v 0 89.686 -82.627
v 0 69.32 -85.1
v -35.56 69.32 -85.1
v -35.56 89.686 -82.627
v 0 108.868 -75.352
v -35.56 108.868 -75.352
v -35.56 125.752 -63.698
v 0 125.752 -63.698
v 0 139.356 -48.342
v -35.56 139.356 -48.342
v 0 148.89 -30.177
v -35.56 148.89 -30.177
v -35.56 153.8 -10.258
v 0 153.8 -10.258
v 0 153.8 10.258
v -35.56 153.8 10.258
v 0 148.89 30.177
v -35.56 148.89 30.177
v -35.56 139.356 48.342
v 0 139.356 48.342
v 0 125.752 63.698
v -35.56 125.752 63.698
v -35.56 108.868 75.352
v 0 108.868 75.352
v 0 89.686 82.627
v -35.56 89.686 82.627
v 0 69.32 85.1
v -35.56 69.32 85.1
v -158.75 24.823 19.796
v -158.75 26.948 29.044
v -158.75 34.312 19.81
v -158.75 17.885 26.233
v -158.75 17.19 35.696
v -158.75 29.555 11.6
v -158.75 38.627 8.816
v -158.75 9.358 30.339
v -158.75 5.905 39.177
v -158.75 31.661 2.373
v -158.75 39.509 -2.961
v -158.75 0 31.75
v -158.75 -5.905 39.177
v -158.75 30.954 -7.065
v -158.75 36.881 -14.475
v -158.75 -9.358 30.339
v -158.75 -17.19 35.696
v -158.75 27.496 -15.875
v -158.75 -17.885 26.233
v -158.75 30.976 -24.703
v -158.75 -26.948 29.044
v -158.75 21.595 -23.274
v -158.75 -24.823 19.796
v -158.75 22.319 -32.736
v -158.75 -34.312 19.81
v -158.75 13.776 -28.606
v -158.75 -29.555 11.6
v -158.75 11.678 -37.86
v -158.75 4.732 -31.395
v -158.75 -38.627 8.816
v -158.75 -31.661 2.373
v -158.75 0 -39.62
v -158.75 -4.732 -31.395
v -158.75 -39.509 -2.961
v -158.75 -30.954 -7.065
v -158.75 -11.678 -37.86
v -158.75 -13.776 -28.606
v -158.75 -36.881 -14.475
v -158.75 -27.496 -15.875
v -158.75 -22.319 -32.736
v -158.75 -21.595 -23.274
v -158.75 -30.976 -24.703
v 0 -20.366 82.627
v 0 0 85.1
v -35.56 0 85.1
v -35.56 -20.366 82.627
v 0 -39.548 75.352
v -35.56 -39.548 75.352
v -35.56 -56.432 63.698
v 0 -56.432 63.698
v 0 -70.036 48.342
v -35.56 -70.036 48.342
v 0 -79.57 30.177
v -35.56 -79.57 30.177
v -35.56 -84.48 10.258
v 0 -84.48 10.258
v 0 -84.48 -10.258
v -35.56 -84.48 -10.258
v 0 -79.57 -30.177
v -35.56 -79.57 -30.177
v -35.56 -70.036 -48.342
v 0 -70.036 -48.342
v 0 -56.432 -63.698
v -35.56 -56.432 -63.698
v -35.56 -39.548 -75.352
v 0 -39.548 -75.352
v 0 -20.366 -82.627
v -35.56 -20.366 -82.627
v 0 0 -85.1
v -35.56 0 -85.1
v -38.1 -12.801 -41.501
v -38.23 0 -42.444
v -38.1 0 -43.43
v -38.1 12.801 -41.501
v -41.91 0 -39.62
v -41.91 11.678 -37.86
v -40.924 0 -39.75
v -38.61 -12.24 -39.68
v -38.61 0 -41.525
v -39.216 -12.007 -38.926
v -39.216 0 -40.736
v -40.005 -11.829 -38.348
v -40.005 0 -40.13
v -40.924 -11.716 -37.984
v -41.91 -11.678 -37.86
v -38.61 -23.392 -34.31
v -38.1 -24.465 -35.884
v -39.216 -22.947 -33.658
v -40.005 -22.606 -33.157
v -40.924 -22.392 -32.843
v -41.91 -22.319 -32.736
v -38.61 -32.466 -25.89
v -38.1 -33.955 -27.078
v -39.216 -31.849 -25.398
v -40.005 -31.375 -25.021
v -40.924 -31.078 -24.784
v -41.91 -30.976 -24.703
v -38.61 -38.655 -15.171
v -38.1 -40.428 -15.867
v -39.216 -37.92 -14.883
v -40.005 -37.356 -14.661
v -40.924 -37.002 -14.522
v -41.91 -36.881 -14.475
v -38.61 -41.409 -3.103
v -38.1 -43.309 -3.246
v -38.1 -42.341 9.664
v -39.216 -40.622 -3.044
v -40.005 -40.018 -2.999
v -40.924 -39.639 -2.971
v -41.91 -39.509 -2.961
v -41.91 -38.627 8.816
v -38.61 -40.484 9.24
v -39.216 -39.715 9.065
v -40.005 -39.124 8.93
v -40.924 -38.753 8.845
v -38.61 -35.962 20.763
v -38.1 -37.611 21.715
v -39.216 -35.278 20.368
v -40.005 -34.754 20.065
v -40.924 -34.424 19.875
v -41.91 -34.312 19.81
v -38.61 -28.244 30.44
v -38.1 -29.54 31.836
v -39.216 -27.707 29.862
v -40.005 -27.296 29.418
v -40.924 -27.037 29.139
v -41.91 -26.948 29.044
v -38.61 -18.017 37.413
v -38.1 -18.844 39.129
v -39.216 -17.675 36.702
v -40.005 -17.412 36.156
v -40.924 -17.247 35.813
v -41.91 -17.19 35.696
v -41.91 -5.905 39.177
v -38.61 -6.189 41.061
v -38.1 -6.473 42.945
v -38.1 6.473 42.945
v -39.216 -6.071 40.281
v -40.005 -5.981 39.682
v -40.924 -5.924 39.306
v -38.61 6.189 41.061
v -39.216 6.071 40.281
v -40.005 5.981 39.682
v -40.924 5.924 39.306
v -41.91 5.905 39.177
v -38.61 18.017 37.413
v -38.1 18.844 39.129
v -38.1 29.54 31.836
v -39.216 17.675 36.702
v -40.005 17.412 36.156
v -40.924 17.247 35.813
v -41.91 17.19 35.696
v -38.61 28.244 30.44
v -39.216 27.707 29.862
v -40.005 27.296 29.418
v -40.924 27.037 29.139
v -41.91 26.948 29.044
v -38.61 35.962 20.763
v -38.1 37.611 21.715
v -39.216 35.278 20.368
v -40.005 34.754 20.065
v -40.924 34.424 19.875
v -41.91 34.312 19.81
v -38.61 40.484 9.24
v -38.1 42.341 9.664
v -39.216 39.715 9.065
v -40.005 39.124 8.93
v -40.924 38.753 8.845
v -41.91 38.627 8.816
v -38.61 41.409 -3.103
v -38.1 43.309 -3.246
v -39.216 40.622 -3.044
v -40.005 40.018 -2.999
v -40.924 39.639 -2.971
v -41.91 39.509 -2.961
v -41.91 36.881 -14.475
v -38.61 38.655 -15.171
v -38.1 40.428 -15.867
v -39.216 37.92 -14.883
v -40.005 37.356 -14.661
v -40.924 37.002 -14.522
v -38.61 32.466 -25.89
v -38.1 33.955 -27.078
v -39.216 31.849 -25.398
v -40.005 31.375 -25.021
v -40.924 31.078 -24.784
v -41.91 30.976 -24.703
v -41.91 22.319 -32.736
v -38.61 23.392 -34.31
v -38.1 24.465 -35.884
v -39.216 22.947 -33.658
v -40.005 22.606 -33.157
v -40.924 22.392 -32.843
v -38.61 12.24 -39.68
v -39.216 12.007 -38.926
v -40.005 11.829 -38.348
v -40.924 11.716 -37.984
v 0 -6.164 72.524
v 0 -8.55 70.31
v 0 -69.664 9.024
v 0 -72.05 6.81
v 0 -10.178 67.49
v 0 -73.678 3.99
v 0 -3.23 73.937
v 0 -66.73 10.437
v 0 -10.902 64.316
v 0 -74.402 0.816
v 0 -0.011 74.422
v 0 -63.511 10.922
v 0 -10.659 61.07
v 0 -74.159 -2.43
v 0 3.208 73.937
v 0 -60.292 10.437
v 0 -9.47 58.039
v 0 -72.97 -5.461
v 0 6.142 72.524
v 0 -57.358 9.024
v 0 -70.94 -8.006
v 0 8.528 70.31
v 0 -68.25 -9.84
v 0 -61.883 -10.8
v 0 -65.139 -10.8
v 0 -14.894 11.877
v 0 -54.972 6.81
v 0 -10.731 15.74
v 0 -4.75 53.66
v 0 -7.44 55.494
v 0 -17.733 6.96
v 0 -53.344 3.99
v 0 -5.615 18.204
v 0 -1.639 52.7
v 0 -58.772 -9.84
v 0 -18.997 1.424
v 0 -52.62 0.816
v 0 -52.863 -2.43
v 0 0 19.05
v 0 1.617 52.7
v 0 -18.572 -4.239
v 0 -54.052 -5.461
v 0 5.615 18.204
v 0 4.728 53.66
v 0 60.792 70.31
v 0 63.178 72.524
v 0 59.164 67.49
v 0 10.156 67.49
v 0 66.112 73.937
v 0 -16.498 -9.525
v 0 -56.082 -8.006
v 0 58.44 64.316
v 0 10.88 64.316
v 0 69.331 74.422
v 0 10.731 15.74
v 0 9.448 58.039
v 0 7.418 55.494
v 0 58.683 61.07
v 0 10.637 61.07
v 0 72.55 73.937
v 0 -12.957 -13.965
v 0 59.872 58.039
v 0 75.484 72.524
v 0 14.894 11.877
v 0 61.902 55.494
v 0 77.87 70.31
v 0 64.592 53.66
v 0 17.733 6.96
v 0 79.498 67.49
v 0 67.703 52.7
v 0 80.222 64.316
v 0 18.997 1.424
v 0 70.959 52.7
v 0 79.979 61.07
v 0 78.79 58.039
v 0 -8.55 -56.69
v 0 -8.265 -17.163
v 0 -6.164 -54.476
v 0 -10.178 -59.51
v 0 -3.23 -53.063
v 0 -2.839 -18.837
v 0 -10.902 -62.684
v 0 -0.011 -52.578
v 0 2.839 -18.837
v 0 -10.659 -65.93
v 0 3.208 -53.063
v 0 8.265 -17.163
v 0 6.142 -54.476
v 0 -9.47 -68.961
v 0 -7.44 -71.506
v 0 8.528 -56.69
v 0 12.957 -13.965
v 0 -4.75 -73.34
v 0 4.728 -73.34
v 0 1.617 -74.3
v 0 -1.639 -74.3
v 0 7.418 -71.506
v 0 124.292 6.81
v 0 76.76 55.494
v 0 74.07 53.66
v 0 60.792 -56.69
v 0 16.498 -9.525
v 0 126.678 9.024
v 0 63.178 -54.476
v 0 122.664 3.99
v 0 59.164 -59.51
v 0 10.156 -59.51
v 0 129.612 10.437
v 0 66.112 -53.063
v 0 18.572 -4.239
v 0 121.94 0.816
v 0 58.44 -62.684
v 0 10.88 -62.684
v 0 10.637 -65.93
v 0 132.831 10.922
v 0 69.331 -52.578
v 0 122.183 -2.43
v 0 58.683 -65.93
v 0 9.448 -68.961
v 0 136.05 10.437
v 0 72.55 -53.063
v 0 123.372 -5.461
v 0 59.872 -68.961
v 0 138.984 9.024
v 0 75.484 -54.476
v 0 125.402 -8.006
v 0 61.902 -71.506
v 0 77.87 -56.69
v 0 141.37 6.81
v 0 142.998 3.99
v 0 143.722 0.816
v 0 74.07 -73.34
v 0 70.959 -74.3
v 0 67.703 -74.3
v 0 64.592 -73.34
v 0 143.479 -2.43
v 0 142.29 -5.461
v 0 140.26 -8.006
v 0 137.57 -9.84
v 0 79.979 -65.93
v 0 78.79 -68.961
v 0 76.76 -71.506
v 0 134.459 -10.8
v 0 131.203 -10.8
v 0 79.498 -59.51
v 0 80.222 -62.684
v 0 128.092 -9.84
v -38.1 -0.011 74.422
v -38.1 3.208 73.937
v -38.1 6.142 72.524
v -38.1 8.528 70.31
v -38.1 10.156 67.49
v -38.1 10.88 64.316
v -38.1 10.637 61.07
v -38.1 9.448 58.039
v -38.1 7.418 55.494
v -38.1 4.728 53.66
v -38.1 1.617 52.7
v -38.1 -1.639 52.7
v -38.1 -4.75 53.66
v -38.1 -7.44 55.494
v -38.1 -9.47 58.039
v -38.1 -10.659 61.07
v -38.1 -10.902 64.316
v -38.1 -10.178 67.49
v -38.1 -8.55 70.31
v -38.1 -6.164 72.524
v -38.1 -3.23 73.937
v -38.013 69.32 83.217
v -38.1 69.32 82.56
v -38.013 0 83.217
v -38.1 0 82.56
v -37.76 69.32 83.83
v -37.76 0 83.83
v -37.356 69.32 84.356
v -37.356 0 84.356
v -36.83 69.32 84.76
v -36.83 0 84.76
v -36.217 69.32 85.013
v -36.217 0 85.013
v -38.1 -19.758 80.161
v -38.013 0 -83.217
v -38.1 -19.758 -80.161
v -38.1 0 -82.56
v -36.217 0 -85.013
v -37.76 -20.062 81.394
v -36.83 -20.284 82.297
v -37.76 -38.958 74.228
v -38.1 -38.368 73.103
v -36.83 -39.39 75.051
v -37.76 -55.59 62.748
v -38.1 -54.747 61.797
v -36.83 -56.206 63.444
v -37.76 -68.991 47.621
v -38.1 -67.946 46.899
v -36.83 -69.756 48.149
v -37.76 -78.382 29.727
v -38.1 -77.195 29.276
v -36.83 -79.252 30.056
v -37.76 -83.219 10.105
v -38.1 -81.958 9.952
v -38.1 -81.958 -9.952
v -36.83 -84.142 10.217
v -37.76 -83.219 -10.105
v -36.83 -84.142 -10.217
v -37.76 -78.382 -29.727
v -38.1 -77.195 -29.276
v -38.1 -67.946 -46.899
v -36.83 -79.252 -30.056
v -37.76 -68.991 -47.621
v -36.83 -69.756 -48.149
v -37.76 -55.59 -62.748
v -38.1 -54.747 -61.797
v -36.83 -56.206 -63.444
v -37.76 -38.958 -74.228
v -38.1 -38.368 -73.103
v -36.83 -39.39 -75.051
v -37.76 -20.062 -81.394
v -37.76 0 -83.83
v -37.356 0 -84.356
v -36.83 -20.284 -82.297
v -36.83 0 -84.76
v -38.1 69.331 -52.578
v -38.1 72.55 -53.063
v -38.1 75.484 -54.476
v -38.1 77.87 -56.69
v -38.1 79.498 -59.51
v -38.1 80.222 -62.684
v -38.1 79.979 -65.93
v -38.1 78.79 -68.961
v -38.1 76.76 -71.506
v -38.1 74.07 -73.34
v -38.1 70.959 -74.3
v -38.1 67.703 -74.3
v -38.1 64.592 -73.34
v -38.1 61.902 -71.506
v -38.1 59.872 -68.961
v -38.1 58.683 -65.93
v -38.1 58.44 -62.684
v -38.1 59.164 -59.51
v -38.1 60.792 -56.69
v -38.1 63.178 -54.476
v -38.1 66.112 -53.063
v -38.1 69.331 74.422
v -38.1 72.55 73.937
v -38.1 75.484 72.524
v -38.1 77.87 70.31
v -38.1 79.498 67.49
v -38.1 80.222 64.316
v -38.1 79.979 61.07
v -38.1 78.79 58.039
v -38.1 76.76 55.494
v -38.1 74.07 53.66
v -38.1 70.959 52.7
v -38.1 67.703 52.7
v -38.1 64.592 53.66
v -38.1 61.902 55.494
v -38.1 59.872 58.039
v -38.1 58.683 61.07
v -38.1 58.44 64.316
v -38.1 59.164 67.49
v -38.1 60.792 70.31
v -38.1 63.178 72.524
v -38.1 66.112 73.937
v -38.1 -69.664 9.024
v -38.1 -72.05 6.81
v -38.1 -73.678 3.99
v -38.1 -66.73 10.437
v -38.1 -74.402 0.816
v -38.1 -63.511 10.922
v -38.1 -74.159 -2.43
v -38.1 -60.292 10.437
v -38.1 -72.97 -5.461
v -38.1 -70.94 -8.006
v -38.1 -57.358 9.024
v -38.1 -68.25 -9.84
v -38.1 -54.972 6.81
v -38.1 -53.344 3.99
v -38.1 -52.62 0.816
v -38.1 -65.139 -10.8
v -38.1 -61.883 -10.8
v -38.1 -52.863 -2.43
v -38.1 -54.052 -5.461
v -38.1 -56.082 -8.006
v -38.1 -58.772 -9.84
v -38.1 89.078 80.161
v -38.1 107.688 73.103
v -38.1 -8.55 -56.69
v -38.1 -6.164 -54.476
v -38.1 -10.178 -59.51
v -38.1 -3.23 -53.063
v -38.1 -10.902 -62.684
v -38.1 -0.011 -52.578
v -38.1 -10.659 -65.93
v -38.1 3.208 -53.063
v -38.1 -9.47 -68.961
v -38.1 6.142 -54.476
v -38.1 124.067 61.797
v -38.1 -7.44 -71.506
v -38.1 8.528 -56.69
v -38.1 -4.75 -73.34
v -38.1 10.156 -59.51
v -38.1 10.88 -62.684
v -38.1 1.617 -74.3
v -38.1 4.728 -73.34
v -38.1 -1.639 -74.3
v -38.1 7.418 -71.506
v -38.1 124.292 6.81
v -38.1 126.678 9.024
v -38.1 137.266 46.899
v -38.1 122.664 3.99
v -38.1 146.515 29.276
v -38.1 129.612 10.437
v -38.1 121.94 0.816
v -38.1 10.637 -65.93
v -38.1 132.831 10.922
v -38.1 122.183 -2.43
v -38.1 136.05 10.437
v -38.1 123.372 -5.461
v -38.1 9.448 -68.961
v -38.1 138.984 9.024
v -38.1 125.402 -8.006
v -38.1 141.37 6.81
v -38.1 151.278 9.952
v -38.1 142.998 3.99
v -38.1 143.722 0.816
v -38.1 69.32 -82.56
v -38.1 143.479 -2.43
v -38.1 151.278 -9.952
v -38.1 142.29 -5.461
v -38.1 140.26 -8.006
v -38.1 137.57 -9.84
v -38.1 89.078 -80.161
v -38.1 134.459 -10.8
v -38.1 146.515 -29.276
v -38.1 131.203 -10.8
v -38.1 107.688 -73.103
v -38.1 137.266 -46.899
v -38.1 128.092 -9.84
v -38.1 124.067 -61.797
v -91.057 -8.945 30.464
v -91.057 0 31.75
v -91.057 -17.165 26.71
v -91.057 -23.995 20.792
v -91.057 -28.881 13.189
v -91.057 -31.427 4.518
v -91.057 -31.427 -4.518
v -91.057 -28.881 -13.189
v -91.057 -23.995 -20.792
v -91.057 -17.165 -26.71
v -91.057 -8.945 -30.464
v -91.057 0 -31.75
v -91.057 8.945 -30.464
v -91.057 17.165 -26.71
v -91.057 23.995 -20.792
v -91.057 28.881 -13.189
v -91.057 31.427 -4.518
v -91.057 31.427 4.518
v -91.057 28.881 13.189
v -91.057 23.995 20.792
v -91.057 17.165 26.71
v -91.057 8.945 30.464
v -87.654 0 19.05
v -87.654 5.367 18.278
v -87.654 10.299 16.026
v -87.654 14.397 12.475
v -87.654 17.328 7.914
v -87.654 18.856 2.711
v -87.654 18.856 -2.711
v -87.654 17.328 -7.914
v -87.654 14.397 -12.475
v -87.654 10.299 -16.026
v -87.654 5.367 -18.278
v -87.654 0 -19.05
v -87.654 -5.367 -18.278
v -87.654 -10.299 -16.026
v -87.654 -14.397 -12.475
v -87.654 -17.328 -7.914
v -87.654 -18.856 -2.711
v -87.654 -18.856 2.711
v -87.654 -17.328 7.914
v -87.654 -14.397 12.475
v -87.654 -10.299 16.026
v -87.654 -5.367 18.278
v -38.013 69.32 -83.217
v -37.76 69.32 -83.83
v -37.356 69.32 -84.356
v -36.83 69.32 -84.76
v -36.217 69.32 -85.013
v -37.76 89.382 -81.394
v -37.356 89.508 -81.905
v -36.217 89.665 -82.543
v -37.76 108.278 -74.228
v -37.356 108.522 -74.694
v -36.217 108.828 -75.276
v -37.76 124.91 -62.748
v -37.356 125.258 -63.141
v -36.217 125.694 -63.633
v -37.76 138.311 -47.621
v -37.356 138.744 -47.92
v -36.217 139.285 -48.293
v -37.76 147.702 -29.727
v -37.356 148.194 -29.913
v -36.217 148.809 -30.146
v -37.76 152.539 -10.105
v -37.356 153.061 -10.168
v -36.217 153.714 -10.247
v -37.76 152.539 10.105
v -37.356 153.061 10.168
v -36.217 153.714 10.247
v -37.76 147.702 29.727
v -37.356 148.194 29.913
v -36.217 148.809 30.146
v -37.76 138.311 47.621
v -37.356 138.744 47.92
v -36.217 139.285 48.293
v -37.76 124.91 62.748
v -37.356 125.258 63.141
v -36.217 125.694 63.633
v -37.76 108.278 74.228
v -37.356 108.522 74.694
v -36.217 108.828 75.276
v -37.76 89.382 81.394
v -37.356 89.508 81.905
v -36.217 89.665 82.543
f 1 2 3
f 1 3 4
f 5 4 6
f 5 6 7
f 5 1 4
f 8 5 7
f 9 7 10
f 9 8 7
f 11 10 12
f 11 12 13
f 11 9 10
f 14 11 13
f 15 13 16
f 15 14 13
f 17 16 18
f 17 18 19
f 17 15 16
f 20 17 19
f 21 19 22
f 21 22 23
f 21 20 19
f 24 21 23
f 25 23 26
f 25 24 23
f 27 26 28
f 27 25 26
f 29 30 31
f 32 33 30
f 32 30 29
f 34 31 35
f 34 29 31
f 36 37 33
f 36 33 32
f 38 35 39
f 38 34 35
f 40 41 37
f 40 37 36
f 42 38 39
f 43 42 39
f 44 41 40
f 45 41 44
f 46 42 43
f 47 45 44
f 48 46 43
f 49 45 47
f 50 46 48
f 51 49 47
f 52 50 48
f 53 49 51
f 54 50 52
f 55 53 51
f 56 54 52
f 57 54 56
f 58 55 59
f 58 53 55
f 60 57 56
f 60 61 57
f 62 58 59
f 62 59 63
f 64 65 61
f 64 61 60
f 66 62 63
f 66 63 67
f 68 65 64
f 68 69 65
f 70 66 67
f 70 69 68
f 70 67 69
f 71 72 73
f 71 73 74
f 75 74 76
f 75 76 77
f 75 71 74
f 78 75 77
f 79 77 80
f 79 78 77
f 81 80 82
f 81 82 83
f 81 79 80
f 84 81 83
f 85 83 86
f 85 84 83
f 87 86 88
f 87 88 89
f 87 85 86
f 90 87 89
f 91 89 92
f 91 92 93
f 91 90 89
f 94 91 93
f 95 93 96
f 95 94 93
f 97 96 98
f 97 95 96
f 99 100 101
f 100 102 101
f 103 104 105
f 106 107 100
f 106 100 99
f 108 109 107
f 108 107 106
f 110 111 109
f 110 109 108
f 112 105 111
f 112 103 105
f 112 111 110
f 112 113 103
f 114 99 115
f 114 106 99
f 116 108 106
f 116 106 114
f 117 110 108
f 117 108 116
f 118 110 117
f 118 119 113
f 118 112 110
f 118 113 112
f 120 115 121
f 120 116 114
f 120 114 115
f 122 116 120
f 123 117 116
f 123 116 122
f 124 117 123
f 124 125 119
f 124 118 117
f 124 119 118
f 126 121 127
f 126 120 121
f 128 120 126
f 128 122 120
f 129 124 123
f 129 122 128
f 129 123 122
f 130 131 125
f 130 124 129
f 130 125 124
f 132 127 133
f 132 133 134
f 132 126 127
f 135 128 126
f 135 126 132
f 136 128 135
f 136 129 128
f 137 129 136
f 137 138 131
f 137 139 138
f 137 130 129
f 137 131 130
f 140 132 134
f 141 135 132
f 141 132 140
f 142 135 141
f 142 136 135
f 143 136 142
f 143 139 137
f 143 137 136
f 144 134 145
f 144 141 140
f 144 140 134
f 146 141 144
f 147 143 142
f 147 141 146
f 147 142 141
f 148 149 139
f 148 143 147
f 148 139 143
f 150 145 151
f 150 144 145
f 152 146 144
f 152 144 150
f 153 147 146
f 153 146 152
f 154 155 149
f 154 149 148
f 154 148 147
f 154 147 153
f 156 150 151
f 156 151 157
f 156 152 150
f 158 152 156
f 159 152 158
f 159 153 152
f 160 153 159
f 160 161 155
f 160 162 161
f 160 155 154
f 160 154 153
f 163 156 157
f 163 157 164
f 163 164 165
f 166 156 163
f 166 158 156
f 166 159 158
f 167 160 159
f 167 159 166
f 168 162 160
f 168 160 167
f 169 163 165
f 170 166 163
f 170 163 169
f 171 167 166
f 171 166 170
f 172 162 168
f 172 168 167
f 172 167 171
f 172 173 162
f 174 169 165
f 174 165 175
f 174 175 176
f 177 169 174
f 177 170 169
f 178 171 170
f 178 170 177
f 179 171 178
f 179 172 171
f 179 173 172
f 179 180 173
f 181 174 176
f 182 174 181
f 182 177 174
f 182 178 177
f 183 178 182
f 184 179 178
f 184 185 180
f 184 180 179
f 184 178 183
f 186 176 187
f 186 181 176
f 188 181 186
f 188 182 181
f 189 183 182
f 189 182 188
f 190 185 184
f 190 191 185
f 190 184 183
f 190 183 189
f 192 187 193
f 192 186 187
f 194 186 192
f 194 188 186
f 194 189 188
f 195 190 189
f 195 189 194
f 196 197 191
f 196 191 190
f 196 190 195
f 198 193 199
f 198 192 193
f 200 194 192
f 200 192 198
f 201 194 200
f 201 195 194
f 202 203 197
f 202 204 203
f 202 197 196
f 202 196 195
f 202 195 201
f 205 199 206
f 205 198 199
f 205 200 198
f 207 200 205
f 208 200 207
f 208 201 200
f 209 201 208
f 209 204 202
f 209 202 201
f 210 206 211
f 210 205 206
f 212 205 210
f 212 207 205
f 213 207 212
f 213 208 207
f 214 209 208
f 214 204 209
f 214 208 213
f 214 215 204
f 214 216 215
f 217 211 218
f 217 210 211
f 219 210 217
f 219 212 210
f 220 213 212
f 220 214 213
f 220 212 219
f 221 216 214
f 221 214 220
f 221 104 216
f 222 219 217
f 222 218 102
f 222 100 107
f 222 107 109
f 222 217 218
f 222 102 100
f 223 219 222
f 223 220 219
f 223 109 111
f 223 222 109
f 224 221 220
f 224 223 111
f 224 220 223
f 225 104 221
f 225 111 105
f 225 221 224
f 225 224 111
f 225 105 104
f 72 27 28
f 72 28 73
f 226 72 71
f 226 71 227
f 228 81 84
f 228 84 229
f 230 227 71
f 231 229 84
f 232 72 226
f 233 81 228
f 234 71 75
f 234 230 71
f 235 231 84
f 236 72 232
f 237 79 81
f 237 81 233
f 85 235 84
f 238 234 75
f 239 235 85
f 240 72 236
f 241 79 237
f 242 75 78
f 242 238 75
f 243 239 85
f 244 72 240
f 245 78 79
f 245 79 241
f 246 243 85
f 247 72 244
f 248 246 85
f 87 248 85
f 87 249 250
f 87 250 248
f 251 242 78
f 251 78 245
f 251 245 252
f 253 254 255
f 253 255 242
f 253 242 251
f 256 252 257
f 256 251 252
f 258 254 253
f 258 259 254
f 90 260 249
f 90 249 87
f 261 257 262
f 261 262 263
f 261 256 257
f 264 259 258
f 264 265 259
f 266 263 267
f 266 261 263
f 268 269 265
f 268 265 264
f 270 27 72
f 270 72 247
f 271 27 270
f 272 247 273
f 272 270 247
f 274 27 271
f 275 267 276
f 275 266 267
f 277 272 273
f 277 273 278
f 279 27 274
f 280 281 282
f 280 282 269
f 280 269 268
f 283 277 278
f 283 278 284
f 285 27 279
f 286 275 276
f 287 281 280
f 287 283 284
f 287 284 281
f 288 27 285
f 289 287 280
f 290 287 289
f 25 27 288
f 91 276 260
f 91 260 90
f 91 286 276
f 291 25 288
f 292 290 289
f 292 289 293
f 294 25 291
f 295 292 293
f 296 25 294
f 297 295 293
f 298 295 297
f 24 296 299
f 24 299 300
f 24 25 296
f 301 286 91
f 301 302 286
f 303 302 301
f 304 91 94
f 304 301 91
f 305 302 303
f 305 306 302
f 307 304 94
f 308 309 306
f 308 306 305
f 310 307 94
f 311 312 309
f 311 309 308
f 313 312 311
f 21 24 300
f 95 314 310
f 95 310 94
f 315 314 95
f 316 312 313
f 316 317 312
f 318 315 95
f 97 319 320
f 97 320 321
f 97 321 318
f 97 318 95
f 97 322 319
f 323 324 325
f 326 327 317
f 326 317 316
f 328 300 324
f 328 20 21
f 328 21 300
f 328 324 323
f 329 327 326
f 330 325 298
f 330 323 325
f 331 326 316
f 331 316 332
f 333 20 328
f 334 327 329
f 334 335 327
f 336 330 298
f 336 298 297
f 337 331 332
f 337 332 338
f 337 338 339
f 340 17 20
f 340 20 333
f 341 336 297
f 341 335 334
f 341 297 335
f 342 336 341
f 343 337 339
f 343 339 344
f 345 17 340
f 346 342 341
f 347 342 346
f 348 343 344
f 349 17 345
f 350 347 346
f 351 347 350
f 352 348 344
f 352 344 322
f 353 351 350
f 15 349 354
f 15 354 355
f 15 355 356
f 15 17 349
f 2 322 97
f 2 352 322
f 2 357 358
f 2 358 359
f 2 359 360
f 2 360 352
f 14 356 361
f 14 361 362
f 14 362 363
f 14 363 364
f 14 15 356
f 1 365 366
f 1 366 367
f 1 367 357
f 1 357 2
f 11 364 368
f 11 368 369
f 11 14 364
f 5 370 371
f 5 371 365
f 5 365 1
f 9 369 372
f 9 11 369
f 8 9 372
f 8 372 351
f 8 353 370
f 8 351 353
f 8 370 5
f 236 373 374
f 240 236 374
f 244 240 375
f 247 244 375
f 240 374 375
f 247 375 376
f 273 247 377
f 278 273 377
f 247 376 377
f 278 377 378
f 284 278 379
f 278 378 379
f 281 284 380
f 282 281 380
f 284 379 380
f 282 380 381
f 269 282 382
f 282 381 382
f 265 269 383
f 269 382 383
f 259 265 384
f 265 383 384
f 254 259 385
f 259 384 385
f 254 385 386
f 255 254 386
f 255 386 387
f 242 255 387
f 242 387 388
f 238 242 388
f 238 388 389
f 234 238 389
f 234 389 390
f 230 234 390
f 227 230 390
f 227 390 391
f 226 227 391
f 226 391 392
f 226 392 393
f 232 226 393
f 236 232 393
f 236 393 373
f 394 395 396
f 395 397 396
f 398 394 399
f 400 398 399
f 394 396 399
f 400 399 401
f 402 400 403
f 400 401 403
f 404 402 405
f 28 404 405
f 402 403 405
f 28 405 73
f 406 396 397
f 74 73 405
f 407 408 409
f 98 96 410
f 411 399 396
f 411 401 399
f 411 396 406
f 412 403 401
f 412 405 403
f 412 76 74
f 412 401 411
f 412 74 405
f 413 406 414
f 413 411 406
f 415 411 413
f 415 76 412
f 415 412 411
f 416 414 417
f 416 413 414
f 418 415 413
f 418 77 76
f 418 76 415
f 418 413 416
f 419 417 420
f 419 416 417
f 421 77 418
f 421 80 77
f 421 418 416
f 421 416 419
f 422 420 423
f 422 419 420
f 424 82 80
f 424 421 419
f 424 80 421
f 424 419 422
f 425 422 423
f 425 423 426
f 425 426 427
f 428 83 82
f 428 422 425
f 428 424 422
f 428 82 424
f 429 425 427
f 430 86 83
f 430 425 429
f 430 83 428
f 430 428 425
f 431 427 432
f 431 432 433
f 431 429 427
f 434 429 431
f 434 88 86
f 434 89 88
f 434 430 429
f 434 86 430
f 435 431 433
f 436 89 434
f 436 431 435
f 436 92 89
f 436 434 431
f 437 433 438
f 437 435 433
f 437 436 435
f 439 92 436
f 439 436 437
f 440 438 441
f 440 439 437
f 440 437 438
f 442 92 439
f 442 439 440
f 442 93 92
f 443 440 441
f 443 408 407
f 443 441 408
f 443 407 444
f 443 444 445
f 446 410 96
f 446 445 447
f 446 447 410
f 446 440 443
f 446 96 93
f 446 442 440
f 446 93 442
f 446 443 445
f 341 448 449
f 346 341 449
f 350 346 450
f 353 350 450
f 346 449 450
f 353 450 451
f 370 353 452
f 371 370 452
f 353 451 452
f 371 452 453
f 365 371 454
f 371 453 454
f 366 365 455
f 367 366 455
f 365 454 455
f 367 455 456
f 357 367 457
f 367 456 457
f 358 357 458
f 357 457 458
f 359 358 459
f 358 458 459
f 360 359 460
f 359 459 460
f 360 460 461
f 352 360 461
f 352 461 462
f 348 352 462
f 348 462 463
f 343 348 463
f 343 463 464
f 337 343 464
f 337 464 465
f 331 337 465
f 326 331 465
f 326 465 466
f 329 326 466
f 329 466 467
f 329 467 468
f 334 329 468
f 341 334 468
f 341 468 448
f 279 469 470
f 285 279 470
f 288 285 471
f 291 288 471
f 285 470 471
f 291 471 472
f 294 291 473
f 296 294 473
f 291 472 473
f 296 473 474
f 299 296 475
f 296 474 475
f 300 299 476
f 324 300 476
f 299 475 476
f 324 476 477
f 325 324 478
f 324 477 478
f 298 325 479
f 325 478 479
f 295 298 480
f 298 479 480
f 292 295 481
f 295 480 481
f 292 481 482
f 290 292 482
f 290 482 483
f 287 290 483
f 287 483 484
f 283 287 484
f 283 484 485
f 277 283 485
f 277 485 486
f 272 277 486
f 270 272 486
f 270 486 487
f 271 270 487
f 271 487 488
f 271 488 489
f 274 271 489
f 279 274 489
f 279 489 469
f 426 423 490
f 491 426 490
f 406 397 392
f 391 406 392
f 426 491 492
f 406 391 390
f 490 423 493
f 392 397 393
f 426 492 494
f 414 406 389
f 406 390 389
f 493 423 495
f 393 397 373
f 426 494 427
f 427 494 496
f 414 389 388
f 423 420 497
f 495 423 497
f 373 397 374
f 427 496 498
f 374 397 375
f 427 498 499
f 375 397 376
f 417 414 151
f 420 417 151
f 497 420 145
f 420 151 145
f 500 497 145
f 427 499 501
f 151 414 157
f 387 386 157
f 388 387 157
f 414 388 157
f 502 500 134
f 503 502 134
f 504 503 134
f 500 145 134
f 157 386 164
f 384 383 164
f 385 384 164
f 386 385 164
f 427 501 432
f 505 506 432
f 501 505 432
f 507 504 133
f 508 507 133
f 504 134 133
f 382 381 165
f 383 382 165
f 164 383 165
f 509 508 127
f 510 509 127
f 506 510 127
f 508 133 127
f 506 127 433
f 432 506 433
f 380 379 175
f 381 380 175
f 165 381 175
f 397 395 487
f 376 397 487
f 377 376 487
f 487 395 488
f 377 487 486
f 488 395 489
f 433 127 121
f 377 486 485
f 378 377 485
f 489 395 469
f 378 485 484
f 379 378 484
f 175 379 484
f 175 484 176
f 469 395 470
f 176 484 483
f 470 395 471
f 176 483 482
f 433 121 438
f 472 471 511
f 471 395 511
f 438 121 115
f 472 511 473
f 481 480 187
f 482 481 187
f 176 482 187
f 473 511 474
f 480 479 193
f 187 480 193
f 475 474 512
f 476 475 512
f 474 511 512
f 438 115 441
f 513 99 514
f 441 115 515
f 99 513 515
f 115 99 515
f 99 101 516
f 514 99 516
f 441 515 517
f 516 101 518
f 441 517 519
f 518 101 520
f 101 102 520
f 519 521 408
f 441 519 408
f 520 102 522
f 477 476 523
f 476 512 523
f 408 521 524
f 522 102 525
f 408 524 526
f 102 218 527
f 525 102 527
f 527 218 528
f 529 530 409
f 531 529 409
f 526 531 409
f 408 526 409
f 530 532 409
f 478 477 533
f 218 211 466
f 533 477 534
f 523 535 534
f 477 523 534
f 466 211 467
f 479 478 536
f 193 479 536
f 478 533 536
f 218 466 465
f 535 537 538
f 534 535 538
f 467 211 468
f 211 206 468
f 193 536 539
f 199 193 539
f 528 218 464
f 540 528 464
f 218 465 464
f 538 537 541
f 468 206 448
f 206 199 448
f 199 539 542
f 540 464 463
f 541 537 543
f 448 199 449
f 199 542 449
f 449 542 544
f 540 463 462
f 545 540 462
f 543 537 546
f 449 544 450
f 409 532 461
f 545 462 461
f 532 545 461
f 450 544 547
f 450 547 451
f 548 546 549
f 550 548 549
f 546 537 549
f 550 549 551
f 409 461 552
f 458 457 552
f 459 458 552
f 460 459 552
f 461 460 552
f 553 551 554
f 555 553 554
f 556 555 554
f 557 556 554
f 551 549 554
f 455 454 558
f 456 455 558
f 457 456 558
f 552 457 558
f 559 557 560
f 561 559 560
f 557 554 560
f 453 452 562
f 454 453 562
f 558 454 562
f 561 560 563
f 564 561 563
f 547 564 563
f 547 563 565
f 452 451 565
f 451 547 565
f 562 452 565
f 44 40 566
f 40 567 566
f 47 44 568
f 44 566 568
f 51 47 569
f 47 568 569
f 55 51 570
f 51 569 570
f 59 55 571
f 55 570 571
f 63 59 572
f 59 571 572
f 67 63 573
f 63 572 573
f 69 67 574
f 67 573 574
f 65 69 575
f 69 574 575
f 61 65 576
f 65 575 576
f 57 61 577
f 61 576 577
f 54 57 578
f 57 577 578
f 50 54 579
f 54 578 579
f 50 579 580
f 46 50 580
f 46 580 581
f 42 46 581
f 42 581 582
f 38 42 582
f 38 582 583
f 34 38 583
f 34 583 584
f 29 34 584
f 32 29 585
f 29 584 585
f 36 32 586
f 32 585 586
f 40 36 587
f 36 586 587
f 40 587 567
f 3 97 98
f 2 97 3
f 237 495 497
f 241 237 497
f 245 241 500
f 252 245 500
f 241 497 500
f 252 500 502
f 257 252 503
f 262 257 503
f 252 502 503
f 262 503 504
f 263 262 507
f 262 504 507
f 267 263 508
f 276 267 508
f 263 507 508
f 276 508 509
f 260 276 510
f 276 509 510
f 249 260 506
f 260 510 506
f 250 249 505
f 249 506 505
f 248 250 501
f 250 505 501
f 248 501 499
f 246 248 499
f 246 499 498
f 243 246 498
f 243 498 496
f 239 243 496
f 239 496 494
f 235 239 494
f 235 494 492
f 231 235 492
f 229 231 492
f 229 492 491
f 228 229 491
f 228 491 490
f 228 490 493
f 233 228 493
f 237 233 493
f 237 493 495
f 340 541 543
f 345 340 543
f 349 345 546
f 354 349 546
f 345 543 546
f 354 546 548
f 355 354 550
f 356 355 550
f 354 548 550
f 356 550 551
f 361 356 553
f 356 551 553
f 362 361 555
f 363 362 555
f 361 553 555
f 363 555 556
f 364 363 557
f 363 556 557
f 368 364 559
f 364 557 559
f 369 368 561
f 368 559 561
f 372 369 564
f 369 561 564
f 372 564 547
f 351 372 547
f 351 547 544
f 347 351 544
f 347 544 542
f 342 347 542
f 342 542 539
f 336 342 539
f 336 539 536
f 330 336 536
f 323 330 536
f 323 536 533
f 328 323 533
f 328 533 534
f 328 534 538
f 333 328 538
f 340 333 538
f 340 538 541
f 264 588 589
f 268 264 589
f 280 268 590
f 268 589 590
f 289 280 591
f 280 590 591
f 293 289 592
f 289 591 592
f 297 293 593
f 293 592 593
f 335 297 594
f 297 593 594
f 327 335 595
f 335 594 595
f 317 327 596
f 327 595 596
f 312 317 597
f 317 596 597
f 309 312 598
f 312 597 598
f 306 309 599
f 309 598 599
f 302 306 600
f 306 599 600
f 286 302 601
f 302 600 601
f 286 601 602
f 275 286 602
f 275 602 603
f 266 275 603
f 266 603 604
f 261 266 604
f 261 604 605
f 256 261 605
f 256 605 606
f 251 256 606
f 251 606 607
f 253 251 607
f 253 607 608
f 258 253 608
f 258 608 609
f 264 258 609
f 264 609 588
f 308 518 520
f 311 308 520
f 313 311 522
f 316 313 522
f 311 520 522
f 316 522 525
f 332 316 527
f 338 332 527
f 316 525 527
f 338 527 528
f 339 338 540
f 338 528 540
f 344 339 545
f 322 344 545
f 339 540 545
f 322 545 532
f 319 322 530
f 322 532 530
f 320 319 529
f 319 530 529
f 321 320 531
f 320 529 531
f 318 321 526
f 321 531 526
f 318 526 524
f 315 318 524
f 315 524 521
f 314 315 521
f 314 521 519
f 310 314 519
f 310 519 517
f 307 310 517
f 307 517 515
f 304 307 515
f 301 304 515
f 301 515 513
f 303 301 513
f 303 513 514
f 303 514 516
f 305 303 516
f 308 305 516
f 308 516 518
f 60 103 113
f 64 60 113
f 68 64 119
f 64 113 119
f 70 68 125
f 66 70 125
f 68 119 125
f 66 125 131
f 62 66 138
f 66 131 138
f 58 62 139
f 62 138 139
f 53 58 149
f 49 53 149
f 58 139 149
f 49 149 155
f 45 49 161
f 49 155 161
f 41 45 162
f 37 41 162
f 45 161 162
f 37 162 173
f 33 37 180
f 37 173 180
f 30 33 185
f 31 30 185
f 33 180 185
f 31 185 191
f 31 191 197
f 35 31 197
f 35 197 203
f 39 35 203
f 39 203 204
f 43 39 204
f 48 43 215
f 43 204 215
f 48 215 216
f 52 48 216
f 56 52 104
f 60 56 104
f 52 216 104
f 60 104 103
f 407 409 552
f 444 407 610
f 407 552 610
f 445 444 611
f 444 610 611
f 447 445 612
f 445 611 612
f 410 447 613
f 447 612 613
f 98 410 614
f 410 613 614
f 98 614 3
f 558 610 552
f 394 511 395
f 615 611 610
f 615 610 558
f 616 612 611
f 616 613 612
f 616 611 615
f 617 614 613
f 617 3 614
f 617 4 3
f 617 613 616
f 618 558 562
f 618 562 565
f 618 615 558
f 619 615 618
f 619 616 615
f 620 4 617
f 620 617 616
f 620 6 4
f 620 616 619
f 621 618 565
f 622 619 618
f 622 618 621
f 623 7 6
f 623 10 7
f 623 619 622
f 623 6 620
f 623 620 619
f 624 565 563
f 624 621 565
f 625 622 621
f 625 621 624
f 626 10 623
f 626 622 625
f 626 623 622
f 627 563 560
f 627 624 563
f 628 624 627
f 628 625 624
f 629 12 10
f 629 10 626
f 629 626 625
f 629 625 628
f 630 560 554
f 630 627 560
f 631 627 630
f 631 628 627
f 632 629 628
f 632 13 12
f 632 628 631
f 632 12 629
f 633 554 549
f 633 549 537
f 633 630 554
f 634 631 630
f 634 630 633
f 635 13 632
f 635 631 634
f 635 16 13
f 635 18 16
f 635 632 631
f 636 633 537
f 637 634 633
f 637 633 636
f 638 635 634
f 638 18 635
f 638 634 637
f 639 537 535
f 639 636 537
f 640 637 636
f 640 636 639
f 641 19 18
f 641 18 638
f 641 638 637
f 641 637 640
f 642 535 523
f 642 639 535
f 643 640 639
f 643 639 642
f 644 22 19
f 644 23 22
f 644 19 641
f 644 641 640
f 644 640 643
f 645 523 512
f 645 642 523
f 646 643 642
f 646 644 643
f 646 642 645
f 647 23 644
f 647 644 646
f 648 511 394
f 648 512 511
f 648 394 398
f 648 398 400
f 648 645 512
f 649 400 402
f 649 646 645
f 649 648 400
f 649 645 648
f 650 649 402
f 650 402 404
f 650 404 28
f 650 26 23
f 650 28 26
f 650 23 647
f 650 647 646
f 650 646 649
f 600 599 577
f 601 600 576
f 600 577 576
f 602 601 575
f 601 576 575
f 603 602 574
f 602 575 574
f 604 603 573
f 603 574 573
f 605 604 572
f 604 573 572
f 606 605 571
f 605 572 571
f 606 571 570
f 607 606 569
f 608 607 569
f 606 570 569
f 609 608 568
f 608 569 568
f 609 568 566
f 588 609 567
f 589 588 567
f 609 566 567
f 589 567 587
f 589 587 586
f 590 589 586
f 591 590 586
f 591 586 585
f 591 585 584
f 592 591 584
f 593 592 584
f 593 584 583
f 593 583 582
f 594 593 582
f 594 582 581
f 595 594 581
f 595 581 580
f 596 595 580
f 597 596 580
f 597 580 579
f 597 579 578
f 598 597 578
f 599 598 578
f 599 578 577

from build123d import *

# Parameters (mm, degrees)
BOSS_EXTRUDE1_DEPTH              = 38.1
SKETCH2_R                        = 39.62
BOSS_EXTRUDE2_DEPTH              = 120.65
F_1_16_1_25_DIAMETER_HOLE1_D     = 31.75
F_1_16_1_25_DIAMETER_HOLE1_DEPTH = 71.94630657
F_1_16_1_25_DIAMETER_HOLE1_TIP   = 4.25369343
SKETCH4_R                        = 19.05
CUT_EXTRUDE1_DEPTH               = 238.253258987
FILLET1_R                        = 3.81
SKETCH6_R                        = 10.922
CUT_EXTRUDE2_DEPTH               = 214.644491855
FILLET2_R                        = 2.54
F_1_16_2_5_DIAMETER_HOLE1_D      = 63.5
F_1_16_2_5_DIAMETER_HOLE1_DEPTH  = 67.69261314
F_1_16_2_5_DIAMETER_HOLE1_TIP    = 8.50738686


with BuildPart() as part:
    # Sketch1 → Boss-Extrude1 (new body)
    with BuildSketch(Plane(origin=(0, 0, 0), x_dir=(0, 0, -1), z_dir=(1, 0, 0))):
        with BuildLine():
            Line((-85.1, 69.32), (-85.1, 0))
            ThreePointArc((-85.1, 0), (0, -85.1), (85.1, 0))
            Line((85.1, 0), (85.1, 69.32))
            ThreePointArc((85.1, 69.32), (0, 154.42), (-85.1, 69.32))
        make_face()
    extrude(amount=-BOSS_EXTRUDE1_DEPTH)

    # Sketch2 → Boss-Extrude2 (add)
    with BuildSketch(Plane.ZY.offset(38.1)):
        with Locations(Location((0, 0, 0), (0, 0, 180))):
            Circle(SKETCH2_R)
    extrude(amount=BOSS_EXTRUDE2_DEPTH)

    # 1/16 (1.25) Diameter Hole1
    with Locations(Plane(origin=(-158.75, 0, 0), x_dir=(0, 0, -1), z_dir=(-1, 0, 0))):
        with Locations((0, 0)):
            Hole(F_1_16_1_25_DIAMETER_HOLE1_D / 2, depth=F_1_16_1_25_DIAMETER_HOLE1_DEPTH)
            with Locations((0, 0, -(F_1_16_1_25_DIAMETER_HOLE1_DEPTH + F_1_16_1_25_DIAMETER_HOLE1_TIP / 2))):  # 150° drill point
                Cone(0, F_1_16_1_25_DIAMETER_HOLE1_D / 2, F_1_16_1_25_DIAMETER_HOLE1_TIP, mode=Mode.SUBTRACT)

    # Sketch4 → Cut-Extrude1 (cut, through all)
    with BuildSketch(Plane.ZY.offset(158.75)):
        Circle(SKETCH4_R)
    extrude(amount=-CUT_EXTRUDE1_DEPTH, mode=Mode.SUBTRACT)

    # Fillet1
    fillet1_edges = [part.edges().sort_by_distance(p)[0] for p in [
        (-38.1, 0, 39.62),
    ]]
    fillet(fillet1_edges, radius=FILLET1_R)

    # Sketch6 → Cut-Extrude2 (cut, through all)
    with BuildSketch(Plane.ZY.offset(38.1)):
        with Locations((0, 132.831)):
            Circle(SKETCH6_R)
        with Locations((63.5, 69.331)):
            Circle(SKETCH6_R)
        with Locations((-63.5, 69.331)):
            Circle(SKETCH6_R)
        with Locations((63.5, -0.011)):
            Circle(SKETCH6_R)
        with Locations((0, -63.511)):
            Circle(SKETCH6_R)
        with Locations((-63.5, -0.011)):
            Circle(SKETCH6_R)
    extrude(amount=-CUT_EXTRUDE2_DEPTH, mode=Mode.SUBTRACT)

    # Fillet2
    fillet2_edges = [part.edges().sort_by_distance(p)[0] for p in [
        (-38.1, -85.1, 0),
        (-38.1, 34.66, -85.1),
        (-38.1, 154.42, 0),
        (-38.1, 34.66, 85.1),
    ]]
    fillet(fillet2_edges, radius=FILLET2_R)

    # 1/16 (2.5) Diameter Hole1
    with Locations(Plane(origin=(-158.75, 0, 0), x_dir=(0, 0, -1), z_dir=(-1, 0, 0))):
        with Locations((0, 0)):
            Hole(F_1_16_2_5_DIAMETER_HOLE1_D / 2, depth=F_1_16_2_5_DIAMETER_HOLE1_DEPTH)
            with Locations((0, 0, -(F_1_16_2_5_DIAMETER_HOLE1_DEPTH + F_1_16_2_5_DIAMETER_HOLE1_TIP / 2))):  # 150° drill point
                Cone(0, F_1_16_2_5_DIAMETER_HOLE1_D / 2, F_1_16_2_5_DIAMETER_HOLE1_TIP, mode=Mode.SUBTRACT)


solid = part.part
